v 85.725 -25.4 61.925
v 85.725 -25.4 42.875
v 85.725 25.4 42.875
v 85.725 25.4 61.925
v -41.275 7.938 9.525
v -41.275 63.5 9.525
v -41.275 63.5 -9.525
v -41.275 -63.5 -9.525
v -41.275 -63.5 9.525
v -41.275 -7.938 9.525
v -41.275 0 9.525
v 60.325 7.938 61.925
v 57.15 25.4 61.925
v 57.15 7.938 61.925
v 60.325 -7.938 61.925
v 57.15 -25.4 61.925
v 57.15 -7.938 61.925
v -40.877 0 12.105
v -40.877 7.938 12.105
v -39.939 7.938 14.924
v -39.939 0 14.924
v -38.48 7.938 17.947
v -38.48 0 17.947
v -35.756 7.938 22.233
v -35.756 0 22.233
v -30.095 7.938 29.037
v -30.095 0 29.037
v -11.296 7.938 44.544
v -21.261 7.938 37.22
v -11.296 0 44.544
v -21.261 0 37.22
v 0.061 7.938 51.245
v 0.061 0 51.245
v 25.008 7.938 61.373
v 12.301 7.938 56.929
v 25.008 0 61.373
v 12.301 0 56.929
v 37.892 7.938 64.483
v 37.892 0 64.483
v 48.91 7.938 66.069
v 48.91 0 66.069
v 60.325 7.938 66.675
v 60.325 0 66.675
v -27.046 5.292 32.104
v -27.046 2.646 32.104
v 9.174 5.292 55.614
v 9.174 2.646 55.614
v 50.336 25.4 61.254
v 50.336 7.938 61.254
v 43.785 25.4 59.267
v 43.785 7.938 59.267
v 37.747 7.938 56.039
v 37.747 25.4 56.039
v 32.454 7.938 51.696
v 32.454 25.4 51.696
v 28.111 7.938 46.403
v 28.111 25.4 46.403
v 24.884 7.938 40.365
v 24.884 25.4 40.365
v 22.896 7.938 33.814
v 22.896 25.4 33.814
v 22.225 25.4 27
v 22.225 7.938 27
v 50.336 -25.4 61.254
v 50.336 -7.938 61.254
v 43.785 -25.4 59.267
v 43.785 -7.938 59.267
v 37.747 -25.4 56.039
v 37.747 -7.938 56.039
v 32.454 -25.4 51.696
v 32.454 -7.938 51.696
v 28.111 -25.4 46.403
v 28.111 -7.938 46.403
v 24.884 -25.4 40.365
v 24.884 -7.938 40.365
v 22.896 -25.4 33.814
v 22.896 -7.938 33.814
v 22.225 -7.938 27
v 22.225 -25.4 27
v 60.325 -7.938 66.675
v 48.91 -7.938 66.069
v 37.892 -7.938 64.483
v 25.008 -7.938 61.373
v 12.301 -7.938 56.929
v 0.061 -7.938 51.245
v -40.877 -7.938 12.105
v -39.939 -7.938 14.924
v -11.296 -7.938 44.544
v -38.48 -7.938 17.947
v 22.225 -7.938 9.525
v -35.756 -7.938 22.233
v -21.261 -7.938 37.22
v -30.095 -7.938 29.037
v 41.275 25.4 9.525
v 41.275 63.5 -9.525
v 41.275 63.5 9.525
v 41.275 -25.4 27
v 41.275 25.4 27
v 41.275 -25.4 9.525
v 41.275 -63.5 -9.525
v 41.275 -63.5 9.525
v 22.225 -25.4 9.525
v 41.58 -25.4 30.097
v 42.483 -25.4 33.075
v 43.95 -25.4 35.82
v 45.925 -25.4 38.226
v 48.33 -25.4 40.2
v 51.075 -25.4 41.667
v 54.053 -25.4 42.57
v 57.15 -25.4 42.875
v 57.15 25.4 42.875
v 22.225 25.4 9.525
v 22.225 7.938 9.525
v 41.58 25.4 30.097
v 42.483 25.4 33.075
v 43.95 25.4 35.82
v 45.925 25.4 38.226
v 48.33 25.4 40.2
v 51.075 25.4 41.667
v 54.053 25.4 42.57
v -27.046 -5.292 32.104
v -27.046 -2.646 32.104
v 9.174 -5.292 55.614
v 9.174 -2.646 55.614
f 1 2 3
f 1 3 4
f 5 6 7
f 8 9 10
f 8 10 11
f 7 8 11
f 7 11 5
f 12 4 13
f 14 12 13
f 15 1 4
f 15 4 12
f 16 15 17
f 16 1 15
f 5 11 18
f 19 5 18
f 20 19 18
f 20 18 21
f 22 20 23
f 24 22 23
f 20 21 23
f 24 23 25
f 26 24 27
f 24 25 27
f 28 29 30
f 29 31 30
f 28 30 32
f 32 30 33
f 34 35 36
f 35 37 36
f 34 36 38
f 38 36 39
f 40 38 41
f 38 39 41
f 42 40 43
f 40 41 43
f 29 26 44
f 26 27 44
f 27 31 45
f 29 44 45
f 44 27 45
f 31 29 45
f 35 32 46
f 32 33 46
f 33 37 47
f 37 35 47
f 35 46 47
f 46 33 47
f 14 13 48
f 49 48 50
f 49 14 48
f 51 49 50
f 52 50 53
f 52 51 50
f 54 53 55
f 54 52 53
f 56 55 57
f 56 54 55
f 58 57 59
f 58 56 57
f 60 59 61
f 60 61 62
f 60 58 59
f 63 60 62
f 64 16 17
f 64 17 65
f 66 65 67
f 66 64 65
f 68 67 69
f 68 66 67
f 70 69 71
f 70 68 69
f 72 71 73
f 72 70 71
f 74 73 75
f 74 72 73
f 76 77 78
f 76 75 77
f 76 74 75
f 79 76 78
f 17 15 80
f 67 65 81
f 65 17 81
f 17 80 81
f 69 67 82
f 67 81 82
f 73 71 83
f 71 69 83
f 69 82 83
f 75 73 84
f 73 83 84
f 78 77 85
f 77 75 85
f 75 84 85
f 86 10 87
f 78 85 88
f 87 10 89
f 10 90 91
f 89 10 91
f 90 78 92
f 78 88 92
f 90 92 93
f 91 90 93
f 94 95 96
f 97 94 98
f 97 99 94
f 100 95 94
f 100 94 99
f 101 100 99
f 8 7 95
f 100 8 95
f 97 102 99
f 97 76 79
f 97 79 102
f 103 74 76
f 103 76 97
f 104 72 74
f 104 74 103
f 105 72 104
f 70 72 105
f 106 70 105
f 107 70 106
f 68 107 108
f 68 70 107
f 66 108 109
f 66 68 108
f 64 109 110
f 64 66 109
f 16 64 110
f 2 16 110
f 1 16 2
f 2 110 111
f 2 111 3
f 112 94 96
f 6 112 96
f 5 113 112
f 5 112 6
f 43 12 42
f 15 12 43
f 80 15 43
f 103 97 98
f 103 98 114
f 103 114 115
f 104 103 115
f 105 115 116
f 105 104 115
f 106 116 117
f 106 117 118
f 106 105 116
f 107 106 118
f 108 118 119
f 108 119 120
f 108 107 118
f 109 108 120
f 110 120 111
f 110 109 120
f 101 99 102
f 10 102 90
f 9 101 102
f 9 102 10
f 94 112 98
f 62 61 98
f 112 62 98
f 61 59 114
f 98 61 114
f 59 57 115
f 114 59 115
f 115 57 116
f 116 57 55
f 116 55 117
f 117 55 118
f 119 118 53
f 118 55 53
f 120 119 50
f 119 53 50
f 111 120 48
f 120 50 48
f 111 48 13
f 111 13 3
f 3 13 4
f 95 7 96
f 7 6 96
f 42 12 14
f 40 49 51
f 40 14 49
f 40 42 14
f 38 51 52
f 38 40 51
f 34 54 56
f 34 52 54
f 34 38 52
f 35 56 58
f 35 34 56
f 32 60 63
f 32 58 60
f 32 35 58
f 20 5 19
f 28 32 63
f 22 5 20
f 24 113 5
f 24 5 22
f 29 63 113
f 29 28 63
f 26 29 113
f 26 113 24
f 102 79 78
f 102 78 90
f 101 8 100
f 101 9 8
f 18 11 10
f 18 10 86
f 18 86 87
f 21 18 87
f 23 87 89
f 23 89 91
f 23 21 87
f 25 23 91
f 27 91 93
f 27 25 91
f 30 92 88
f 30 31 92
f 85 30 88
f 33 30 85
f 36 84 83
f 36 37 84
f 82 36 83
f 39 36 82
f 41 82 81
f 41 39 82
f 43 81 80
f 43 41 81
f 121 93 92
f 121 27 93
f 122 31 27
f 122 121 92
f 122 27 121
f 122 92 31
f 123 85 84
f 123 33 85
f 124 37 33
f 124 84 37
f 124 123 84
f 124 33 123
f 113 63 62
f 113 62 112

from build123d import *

# Parameters (mm, degrees)
F1_DEPTH = 63.5
F0_W     = 25.4
F0_H     = 19.05
F2_DEPTH = 25.4
F3_DEPTH = 7.9375


# Not quite as in the source:
# - a feature of the source that left no trace in its solid (it failed there, or was rolled back) is left out


with BuildPart() as f1:
    # F0 (on Front) → F1 (new body, symmetric)
    with BuildSketch(Plane.XZ):
        Polygon((-41.275, -9.525), (41.275, -9.525), (41.275, 9.525), (22.225, 9.525), (-41.275, 9.525), align=None)
    extrude(amount=F1_DEPTH, both=True)

    # F0 (on Front) → F2 (join, symmetric)
    with BuildSketch(Plane.XZ):
        with BuildLine():
            Line((22.225, 9.525), (41.275, 9.525))
            Line((41.275, 9.525), (41.275, 27.0002))
            ThreePointArc((41.275, 27.0002), (45.9246798487, 38.2255201513), (57.15, 42.8752))
            Line((57.15, 42.8752), (60.325, 42.8752))
            Line((60.325, 42.8752), (60.325, 61.9252))
            Line((60.325, 61.9252), (57.15, 61.9252))
            ThreePointArc((57.15, 61.9252), (32.4542956671, 51.6959043329), (22.225, 27.0002))
            Line((22.225, 27.0002), (22.225, 9.525))
        make_face()
        with Locations((73.025, 52.4002)):
            Rectangle(F0_W, F0_H)
    extrude(amount=F2_DEPTH, both=True)

    # F0 (on Front) → F3 (join, symmetric)
    with BuildSketch(Plane.XZ):
        with BuildLine():
            add(Edge.make_bspline(
                [(-41.275, 9.525), (-40.3944440186, 27.1777566522), (4.0625981055, 66.2999525666), (60.325, 66.675)],
                knots=[0, 0, 0, 0, 116.5705044169, 116.5705044169, 116.5705044169, 116.5705044169], degree=3))
            Line((-41.275, 9.525), (22.225, 9.525))
            Line((22.225, 9.525), (22.225, 27.0002))
            ThreePointArc((22.225, 27.0002), (32.4542956671, 51.6959043329), (57.15, 61.9252))
            Line((57.15, 61.9252), (60.325, 61.9252))
            Line((60.325, 61.9252), (60.325, 66.675))
        make_face()
    extrude(amount=F3_DEPTH, both=True)


solid = f1.part
